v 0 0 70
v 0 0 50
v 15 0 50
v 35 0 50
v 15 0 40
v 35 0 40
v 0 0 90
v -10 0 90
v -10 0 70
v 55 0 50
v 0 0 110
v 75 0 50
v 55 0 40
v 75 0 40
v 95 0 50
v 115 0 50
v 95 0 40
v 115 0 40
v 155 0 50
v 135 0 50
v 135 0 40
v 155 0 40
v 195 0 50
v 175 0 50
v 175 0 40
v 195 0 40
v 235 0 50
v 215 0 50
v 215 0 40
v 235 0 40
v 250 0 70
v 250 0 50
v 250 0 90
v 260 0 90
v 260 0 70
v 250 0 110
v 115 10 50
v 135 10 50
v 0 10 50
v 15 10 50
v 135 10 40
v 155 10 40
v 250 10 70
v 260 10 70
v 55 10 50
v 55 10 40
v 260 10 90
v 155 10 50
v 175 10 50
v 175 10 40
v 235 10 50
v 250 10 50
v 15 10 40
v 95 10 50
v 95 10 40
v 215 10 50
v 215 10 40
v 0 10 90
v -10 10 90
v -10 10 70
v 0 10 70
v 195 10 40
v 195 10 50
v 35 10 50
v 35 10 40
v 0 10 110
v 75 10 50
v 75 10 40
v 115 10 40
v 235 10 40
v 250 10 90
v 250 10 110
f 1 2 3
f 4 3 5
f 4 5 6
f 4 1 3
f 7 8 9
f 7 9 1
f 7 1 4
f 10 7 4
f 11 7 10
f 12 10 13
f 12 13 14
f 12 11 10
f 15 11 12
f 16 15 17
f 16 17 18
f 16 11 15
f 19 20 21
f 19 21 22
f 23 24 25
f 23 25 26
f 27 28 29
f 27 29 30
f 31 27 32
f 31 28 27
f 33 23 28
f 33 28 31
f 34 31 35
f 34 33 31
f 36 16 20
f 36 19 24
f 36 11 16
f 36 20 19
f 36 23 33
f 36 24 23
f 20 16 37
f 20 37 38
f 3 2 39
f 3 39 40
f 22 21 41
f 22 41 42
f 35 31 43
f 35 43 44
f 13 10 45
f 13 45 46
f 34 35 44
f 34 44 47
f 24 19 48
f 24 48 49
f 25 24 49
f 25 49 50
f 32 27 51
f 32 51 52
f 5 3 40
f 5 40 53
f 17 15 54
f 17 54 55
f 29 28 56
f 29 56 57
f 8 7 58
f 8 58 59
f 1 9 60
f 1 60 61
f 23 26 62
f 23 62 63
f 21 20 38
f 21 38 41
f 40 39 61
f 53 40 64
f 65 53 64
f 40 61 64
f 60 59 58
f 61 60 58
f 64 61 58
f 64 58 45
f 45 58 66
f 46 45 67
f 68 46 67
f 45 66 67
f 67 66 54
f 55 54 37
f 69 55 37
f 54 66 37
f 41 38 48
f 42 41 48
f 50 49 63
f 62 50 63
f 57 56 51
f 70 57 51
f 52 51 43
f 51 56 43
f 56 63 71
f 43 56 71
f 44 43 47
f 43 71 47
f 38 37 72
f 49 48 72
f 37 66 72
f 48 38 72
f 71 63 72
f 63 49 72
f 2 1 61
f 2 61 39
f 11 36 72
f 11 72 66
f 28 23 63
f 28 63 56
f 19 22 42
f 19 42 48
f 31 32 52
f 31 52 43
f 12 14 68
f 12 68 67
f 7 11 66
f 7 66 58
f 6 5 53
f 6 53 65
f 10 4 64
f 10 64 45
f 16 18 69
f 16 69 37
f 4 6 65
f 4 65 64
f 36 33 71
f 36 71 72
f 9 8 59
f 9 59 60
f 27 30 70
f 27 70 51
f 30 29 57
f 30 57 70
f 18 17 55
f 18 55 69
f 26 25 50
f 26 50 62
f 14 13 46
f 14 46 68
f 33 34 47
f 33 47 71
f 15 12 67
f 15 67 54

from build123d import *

# Parameters (mm, degrees)
F1_DEPTH = 10


# Not quite as in the source:
# - a feature names something its author has since deleted; it is built from what else it names


with BuildPart() as f1:
    # F0 (on Front) → F1 (new body)
    with BuildSketch(Plane.XZ):
        Polygon((235, 50), (250, 50), (250, 70), (260, 70), (260, 90), (250, 90), (250, 110), (0, 110), (0, 90), (-10, 90), (-10, 70), (0, 70), (0, 50), (15, 50), (15, 40), (35, 40), (35, 50), (55, 50), (55, 40), (75, 40), (75, 50), (95, 50), (95, 40), (115, 40), (115, 50), (135, 50), (135, 40), (155, 40), (155, 50), (175, 50), (175, 40), (195, 40), (195, 50), (215, 50), (215, 40), (235, 40), align=None)
    extrude(amount=-F1_DEPTH)


solid = f1.part
